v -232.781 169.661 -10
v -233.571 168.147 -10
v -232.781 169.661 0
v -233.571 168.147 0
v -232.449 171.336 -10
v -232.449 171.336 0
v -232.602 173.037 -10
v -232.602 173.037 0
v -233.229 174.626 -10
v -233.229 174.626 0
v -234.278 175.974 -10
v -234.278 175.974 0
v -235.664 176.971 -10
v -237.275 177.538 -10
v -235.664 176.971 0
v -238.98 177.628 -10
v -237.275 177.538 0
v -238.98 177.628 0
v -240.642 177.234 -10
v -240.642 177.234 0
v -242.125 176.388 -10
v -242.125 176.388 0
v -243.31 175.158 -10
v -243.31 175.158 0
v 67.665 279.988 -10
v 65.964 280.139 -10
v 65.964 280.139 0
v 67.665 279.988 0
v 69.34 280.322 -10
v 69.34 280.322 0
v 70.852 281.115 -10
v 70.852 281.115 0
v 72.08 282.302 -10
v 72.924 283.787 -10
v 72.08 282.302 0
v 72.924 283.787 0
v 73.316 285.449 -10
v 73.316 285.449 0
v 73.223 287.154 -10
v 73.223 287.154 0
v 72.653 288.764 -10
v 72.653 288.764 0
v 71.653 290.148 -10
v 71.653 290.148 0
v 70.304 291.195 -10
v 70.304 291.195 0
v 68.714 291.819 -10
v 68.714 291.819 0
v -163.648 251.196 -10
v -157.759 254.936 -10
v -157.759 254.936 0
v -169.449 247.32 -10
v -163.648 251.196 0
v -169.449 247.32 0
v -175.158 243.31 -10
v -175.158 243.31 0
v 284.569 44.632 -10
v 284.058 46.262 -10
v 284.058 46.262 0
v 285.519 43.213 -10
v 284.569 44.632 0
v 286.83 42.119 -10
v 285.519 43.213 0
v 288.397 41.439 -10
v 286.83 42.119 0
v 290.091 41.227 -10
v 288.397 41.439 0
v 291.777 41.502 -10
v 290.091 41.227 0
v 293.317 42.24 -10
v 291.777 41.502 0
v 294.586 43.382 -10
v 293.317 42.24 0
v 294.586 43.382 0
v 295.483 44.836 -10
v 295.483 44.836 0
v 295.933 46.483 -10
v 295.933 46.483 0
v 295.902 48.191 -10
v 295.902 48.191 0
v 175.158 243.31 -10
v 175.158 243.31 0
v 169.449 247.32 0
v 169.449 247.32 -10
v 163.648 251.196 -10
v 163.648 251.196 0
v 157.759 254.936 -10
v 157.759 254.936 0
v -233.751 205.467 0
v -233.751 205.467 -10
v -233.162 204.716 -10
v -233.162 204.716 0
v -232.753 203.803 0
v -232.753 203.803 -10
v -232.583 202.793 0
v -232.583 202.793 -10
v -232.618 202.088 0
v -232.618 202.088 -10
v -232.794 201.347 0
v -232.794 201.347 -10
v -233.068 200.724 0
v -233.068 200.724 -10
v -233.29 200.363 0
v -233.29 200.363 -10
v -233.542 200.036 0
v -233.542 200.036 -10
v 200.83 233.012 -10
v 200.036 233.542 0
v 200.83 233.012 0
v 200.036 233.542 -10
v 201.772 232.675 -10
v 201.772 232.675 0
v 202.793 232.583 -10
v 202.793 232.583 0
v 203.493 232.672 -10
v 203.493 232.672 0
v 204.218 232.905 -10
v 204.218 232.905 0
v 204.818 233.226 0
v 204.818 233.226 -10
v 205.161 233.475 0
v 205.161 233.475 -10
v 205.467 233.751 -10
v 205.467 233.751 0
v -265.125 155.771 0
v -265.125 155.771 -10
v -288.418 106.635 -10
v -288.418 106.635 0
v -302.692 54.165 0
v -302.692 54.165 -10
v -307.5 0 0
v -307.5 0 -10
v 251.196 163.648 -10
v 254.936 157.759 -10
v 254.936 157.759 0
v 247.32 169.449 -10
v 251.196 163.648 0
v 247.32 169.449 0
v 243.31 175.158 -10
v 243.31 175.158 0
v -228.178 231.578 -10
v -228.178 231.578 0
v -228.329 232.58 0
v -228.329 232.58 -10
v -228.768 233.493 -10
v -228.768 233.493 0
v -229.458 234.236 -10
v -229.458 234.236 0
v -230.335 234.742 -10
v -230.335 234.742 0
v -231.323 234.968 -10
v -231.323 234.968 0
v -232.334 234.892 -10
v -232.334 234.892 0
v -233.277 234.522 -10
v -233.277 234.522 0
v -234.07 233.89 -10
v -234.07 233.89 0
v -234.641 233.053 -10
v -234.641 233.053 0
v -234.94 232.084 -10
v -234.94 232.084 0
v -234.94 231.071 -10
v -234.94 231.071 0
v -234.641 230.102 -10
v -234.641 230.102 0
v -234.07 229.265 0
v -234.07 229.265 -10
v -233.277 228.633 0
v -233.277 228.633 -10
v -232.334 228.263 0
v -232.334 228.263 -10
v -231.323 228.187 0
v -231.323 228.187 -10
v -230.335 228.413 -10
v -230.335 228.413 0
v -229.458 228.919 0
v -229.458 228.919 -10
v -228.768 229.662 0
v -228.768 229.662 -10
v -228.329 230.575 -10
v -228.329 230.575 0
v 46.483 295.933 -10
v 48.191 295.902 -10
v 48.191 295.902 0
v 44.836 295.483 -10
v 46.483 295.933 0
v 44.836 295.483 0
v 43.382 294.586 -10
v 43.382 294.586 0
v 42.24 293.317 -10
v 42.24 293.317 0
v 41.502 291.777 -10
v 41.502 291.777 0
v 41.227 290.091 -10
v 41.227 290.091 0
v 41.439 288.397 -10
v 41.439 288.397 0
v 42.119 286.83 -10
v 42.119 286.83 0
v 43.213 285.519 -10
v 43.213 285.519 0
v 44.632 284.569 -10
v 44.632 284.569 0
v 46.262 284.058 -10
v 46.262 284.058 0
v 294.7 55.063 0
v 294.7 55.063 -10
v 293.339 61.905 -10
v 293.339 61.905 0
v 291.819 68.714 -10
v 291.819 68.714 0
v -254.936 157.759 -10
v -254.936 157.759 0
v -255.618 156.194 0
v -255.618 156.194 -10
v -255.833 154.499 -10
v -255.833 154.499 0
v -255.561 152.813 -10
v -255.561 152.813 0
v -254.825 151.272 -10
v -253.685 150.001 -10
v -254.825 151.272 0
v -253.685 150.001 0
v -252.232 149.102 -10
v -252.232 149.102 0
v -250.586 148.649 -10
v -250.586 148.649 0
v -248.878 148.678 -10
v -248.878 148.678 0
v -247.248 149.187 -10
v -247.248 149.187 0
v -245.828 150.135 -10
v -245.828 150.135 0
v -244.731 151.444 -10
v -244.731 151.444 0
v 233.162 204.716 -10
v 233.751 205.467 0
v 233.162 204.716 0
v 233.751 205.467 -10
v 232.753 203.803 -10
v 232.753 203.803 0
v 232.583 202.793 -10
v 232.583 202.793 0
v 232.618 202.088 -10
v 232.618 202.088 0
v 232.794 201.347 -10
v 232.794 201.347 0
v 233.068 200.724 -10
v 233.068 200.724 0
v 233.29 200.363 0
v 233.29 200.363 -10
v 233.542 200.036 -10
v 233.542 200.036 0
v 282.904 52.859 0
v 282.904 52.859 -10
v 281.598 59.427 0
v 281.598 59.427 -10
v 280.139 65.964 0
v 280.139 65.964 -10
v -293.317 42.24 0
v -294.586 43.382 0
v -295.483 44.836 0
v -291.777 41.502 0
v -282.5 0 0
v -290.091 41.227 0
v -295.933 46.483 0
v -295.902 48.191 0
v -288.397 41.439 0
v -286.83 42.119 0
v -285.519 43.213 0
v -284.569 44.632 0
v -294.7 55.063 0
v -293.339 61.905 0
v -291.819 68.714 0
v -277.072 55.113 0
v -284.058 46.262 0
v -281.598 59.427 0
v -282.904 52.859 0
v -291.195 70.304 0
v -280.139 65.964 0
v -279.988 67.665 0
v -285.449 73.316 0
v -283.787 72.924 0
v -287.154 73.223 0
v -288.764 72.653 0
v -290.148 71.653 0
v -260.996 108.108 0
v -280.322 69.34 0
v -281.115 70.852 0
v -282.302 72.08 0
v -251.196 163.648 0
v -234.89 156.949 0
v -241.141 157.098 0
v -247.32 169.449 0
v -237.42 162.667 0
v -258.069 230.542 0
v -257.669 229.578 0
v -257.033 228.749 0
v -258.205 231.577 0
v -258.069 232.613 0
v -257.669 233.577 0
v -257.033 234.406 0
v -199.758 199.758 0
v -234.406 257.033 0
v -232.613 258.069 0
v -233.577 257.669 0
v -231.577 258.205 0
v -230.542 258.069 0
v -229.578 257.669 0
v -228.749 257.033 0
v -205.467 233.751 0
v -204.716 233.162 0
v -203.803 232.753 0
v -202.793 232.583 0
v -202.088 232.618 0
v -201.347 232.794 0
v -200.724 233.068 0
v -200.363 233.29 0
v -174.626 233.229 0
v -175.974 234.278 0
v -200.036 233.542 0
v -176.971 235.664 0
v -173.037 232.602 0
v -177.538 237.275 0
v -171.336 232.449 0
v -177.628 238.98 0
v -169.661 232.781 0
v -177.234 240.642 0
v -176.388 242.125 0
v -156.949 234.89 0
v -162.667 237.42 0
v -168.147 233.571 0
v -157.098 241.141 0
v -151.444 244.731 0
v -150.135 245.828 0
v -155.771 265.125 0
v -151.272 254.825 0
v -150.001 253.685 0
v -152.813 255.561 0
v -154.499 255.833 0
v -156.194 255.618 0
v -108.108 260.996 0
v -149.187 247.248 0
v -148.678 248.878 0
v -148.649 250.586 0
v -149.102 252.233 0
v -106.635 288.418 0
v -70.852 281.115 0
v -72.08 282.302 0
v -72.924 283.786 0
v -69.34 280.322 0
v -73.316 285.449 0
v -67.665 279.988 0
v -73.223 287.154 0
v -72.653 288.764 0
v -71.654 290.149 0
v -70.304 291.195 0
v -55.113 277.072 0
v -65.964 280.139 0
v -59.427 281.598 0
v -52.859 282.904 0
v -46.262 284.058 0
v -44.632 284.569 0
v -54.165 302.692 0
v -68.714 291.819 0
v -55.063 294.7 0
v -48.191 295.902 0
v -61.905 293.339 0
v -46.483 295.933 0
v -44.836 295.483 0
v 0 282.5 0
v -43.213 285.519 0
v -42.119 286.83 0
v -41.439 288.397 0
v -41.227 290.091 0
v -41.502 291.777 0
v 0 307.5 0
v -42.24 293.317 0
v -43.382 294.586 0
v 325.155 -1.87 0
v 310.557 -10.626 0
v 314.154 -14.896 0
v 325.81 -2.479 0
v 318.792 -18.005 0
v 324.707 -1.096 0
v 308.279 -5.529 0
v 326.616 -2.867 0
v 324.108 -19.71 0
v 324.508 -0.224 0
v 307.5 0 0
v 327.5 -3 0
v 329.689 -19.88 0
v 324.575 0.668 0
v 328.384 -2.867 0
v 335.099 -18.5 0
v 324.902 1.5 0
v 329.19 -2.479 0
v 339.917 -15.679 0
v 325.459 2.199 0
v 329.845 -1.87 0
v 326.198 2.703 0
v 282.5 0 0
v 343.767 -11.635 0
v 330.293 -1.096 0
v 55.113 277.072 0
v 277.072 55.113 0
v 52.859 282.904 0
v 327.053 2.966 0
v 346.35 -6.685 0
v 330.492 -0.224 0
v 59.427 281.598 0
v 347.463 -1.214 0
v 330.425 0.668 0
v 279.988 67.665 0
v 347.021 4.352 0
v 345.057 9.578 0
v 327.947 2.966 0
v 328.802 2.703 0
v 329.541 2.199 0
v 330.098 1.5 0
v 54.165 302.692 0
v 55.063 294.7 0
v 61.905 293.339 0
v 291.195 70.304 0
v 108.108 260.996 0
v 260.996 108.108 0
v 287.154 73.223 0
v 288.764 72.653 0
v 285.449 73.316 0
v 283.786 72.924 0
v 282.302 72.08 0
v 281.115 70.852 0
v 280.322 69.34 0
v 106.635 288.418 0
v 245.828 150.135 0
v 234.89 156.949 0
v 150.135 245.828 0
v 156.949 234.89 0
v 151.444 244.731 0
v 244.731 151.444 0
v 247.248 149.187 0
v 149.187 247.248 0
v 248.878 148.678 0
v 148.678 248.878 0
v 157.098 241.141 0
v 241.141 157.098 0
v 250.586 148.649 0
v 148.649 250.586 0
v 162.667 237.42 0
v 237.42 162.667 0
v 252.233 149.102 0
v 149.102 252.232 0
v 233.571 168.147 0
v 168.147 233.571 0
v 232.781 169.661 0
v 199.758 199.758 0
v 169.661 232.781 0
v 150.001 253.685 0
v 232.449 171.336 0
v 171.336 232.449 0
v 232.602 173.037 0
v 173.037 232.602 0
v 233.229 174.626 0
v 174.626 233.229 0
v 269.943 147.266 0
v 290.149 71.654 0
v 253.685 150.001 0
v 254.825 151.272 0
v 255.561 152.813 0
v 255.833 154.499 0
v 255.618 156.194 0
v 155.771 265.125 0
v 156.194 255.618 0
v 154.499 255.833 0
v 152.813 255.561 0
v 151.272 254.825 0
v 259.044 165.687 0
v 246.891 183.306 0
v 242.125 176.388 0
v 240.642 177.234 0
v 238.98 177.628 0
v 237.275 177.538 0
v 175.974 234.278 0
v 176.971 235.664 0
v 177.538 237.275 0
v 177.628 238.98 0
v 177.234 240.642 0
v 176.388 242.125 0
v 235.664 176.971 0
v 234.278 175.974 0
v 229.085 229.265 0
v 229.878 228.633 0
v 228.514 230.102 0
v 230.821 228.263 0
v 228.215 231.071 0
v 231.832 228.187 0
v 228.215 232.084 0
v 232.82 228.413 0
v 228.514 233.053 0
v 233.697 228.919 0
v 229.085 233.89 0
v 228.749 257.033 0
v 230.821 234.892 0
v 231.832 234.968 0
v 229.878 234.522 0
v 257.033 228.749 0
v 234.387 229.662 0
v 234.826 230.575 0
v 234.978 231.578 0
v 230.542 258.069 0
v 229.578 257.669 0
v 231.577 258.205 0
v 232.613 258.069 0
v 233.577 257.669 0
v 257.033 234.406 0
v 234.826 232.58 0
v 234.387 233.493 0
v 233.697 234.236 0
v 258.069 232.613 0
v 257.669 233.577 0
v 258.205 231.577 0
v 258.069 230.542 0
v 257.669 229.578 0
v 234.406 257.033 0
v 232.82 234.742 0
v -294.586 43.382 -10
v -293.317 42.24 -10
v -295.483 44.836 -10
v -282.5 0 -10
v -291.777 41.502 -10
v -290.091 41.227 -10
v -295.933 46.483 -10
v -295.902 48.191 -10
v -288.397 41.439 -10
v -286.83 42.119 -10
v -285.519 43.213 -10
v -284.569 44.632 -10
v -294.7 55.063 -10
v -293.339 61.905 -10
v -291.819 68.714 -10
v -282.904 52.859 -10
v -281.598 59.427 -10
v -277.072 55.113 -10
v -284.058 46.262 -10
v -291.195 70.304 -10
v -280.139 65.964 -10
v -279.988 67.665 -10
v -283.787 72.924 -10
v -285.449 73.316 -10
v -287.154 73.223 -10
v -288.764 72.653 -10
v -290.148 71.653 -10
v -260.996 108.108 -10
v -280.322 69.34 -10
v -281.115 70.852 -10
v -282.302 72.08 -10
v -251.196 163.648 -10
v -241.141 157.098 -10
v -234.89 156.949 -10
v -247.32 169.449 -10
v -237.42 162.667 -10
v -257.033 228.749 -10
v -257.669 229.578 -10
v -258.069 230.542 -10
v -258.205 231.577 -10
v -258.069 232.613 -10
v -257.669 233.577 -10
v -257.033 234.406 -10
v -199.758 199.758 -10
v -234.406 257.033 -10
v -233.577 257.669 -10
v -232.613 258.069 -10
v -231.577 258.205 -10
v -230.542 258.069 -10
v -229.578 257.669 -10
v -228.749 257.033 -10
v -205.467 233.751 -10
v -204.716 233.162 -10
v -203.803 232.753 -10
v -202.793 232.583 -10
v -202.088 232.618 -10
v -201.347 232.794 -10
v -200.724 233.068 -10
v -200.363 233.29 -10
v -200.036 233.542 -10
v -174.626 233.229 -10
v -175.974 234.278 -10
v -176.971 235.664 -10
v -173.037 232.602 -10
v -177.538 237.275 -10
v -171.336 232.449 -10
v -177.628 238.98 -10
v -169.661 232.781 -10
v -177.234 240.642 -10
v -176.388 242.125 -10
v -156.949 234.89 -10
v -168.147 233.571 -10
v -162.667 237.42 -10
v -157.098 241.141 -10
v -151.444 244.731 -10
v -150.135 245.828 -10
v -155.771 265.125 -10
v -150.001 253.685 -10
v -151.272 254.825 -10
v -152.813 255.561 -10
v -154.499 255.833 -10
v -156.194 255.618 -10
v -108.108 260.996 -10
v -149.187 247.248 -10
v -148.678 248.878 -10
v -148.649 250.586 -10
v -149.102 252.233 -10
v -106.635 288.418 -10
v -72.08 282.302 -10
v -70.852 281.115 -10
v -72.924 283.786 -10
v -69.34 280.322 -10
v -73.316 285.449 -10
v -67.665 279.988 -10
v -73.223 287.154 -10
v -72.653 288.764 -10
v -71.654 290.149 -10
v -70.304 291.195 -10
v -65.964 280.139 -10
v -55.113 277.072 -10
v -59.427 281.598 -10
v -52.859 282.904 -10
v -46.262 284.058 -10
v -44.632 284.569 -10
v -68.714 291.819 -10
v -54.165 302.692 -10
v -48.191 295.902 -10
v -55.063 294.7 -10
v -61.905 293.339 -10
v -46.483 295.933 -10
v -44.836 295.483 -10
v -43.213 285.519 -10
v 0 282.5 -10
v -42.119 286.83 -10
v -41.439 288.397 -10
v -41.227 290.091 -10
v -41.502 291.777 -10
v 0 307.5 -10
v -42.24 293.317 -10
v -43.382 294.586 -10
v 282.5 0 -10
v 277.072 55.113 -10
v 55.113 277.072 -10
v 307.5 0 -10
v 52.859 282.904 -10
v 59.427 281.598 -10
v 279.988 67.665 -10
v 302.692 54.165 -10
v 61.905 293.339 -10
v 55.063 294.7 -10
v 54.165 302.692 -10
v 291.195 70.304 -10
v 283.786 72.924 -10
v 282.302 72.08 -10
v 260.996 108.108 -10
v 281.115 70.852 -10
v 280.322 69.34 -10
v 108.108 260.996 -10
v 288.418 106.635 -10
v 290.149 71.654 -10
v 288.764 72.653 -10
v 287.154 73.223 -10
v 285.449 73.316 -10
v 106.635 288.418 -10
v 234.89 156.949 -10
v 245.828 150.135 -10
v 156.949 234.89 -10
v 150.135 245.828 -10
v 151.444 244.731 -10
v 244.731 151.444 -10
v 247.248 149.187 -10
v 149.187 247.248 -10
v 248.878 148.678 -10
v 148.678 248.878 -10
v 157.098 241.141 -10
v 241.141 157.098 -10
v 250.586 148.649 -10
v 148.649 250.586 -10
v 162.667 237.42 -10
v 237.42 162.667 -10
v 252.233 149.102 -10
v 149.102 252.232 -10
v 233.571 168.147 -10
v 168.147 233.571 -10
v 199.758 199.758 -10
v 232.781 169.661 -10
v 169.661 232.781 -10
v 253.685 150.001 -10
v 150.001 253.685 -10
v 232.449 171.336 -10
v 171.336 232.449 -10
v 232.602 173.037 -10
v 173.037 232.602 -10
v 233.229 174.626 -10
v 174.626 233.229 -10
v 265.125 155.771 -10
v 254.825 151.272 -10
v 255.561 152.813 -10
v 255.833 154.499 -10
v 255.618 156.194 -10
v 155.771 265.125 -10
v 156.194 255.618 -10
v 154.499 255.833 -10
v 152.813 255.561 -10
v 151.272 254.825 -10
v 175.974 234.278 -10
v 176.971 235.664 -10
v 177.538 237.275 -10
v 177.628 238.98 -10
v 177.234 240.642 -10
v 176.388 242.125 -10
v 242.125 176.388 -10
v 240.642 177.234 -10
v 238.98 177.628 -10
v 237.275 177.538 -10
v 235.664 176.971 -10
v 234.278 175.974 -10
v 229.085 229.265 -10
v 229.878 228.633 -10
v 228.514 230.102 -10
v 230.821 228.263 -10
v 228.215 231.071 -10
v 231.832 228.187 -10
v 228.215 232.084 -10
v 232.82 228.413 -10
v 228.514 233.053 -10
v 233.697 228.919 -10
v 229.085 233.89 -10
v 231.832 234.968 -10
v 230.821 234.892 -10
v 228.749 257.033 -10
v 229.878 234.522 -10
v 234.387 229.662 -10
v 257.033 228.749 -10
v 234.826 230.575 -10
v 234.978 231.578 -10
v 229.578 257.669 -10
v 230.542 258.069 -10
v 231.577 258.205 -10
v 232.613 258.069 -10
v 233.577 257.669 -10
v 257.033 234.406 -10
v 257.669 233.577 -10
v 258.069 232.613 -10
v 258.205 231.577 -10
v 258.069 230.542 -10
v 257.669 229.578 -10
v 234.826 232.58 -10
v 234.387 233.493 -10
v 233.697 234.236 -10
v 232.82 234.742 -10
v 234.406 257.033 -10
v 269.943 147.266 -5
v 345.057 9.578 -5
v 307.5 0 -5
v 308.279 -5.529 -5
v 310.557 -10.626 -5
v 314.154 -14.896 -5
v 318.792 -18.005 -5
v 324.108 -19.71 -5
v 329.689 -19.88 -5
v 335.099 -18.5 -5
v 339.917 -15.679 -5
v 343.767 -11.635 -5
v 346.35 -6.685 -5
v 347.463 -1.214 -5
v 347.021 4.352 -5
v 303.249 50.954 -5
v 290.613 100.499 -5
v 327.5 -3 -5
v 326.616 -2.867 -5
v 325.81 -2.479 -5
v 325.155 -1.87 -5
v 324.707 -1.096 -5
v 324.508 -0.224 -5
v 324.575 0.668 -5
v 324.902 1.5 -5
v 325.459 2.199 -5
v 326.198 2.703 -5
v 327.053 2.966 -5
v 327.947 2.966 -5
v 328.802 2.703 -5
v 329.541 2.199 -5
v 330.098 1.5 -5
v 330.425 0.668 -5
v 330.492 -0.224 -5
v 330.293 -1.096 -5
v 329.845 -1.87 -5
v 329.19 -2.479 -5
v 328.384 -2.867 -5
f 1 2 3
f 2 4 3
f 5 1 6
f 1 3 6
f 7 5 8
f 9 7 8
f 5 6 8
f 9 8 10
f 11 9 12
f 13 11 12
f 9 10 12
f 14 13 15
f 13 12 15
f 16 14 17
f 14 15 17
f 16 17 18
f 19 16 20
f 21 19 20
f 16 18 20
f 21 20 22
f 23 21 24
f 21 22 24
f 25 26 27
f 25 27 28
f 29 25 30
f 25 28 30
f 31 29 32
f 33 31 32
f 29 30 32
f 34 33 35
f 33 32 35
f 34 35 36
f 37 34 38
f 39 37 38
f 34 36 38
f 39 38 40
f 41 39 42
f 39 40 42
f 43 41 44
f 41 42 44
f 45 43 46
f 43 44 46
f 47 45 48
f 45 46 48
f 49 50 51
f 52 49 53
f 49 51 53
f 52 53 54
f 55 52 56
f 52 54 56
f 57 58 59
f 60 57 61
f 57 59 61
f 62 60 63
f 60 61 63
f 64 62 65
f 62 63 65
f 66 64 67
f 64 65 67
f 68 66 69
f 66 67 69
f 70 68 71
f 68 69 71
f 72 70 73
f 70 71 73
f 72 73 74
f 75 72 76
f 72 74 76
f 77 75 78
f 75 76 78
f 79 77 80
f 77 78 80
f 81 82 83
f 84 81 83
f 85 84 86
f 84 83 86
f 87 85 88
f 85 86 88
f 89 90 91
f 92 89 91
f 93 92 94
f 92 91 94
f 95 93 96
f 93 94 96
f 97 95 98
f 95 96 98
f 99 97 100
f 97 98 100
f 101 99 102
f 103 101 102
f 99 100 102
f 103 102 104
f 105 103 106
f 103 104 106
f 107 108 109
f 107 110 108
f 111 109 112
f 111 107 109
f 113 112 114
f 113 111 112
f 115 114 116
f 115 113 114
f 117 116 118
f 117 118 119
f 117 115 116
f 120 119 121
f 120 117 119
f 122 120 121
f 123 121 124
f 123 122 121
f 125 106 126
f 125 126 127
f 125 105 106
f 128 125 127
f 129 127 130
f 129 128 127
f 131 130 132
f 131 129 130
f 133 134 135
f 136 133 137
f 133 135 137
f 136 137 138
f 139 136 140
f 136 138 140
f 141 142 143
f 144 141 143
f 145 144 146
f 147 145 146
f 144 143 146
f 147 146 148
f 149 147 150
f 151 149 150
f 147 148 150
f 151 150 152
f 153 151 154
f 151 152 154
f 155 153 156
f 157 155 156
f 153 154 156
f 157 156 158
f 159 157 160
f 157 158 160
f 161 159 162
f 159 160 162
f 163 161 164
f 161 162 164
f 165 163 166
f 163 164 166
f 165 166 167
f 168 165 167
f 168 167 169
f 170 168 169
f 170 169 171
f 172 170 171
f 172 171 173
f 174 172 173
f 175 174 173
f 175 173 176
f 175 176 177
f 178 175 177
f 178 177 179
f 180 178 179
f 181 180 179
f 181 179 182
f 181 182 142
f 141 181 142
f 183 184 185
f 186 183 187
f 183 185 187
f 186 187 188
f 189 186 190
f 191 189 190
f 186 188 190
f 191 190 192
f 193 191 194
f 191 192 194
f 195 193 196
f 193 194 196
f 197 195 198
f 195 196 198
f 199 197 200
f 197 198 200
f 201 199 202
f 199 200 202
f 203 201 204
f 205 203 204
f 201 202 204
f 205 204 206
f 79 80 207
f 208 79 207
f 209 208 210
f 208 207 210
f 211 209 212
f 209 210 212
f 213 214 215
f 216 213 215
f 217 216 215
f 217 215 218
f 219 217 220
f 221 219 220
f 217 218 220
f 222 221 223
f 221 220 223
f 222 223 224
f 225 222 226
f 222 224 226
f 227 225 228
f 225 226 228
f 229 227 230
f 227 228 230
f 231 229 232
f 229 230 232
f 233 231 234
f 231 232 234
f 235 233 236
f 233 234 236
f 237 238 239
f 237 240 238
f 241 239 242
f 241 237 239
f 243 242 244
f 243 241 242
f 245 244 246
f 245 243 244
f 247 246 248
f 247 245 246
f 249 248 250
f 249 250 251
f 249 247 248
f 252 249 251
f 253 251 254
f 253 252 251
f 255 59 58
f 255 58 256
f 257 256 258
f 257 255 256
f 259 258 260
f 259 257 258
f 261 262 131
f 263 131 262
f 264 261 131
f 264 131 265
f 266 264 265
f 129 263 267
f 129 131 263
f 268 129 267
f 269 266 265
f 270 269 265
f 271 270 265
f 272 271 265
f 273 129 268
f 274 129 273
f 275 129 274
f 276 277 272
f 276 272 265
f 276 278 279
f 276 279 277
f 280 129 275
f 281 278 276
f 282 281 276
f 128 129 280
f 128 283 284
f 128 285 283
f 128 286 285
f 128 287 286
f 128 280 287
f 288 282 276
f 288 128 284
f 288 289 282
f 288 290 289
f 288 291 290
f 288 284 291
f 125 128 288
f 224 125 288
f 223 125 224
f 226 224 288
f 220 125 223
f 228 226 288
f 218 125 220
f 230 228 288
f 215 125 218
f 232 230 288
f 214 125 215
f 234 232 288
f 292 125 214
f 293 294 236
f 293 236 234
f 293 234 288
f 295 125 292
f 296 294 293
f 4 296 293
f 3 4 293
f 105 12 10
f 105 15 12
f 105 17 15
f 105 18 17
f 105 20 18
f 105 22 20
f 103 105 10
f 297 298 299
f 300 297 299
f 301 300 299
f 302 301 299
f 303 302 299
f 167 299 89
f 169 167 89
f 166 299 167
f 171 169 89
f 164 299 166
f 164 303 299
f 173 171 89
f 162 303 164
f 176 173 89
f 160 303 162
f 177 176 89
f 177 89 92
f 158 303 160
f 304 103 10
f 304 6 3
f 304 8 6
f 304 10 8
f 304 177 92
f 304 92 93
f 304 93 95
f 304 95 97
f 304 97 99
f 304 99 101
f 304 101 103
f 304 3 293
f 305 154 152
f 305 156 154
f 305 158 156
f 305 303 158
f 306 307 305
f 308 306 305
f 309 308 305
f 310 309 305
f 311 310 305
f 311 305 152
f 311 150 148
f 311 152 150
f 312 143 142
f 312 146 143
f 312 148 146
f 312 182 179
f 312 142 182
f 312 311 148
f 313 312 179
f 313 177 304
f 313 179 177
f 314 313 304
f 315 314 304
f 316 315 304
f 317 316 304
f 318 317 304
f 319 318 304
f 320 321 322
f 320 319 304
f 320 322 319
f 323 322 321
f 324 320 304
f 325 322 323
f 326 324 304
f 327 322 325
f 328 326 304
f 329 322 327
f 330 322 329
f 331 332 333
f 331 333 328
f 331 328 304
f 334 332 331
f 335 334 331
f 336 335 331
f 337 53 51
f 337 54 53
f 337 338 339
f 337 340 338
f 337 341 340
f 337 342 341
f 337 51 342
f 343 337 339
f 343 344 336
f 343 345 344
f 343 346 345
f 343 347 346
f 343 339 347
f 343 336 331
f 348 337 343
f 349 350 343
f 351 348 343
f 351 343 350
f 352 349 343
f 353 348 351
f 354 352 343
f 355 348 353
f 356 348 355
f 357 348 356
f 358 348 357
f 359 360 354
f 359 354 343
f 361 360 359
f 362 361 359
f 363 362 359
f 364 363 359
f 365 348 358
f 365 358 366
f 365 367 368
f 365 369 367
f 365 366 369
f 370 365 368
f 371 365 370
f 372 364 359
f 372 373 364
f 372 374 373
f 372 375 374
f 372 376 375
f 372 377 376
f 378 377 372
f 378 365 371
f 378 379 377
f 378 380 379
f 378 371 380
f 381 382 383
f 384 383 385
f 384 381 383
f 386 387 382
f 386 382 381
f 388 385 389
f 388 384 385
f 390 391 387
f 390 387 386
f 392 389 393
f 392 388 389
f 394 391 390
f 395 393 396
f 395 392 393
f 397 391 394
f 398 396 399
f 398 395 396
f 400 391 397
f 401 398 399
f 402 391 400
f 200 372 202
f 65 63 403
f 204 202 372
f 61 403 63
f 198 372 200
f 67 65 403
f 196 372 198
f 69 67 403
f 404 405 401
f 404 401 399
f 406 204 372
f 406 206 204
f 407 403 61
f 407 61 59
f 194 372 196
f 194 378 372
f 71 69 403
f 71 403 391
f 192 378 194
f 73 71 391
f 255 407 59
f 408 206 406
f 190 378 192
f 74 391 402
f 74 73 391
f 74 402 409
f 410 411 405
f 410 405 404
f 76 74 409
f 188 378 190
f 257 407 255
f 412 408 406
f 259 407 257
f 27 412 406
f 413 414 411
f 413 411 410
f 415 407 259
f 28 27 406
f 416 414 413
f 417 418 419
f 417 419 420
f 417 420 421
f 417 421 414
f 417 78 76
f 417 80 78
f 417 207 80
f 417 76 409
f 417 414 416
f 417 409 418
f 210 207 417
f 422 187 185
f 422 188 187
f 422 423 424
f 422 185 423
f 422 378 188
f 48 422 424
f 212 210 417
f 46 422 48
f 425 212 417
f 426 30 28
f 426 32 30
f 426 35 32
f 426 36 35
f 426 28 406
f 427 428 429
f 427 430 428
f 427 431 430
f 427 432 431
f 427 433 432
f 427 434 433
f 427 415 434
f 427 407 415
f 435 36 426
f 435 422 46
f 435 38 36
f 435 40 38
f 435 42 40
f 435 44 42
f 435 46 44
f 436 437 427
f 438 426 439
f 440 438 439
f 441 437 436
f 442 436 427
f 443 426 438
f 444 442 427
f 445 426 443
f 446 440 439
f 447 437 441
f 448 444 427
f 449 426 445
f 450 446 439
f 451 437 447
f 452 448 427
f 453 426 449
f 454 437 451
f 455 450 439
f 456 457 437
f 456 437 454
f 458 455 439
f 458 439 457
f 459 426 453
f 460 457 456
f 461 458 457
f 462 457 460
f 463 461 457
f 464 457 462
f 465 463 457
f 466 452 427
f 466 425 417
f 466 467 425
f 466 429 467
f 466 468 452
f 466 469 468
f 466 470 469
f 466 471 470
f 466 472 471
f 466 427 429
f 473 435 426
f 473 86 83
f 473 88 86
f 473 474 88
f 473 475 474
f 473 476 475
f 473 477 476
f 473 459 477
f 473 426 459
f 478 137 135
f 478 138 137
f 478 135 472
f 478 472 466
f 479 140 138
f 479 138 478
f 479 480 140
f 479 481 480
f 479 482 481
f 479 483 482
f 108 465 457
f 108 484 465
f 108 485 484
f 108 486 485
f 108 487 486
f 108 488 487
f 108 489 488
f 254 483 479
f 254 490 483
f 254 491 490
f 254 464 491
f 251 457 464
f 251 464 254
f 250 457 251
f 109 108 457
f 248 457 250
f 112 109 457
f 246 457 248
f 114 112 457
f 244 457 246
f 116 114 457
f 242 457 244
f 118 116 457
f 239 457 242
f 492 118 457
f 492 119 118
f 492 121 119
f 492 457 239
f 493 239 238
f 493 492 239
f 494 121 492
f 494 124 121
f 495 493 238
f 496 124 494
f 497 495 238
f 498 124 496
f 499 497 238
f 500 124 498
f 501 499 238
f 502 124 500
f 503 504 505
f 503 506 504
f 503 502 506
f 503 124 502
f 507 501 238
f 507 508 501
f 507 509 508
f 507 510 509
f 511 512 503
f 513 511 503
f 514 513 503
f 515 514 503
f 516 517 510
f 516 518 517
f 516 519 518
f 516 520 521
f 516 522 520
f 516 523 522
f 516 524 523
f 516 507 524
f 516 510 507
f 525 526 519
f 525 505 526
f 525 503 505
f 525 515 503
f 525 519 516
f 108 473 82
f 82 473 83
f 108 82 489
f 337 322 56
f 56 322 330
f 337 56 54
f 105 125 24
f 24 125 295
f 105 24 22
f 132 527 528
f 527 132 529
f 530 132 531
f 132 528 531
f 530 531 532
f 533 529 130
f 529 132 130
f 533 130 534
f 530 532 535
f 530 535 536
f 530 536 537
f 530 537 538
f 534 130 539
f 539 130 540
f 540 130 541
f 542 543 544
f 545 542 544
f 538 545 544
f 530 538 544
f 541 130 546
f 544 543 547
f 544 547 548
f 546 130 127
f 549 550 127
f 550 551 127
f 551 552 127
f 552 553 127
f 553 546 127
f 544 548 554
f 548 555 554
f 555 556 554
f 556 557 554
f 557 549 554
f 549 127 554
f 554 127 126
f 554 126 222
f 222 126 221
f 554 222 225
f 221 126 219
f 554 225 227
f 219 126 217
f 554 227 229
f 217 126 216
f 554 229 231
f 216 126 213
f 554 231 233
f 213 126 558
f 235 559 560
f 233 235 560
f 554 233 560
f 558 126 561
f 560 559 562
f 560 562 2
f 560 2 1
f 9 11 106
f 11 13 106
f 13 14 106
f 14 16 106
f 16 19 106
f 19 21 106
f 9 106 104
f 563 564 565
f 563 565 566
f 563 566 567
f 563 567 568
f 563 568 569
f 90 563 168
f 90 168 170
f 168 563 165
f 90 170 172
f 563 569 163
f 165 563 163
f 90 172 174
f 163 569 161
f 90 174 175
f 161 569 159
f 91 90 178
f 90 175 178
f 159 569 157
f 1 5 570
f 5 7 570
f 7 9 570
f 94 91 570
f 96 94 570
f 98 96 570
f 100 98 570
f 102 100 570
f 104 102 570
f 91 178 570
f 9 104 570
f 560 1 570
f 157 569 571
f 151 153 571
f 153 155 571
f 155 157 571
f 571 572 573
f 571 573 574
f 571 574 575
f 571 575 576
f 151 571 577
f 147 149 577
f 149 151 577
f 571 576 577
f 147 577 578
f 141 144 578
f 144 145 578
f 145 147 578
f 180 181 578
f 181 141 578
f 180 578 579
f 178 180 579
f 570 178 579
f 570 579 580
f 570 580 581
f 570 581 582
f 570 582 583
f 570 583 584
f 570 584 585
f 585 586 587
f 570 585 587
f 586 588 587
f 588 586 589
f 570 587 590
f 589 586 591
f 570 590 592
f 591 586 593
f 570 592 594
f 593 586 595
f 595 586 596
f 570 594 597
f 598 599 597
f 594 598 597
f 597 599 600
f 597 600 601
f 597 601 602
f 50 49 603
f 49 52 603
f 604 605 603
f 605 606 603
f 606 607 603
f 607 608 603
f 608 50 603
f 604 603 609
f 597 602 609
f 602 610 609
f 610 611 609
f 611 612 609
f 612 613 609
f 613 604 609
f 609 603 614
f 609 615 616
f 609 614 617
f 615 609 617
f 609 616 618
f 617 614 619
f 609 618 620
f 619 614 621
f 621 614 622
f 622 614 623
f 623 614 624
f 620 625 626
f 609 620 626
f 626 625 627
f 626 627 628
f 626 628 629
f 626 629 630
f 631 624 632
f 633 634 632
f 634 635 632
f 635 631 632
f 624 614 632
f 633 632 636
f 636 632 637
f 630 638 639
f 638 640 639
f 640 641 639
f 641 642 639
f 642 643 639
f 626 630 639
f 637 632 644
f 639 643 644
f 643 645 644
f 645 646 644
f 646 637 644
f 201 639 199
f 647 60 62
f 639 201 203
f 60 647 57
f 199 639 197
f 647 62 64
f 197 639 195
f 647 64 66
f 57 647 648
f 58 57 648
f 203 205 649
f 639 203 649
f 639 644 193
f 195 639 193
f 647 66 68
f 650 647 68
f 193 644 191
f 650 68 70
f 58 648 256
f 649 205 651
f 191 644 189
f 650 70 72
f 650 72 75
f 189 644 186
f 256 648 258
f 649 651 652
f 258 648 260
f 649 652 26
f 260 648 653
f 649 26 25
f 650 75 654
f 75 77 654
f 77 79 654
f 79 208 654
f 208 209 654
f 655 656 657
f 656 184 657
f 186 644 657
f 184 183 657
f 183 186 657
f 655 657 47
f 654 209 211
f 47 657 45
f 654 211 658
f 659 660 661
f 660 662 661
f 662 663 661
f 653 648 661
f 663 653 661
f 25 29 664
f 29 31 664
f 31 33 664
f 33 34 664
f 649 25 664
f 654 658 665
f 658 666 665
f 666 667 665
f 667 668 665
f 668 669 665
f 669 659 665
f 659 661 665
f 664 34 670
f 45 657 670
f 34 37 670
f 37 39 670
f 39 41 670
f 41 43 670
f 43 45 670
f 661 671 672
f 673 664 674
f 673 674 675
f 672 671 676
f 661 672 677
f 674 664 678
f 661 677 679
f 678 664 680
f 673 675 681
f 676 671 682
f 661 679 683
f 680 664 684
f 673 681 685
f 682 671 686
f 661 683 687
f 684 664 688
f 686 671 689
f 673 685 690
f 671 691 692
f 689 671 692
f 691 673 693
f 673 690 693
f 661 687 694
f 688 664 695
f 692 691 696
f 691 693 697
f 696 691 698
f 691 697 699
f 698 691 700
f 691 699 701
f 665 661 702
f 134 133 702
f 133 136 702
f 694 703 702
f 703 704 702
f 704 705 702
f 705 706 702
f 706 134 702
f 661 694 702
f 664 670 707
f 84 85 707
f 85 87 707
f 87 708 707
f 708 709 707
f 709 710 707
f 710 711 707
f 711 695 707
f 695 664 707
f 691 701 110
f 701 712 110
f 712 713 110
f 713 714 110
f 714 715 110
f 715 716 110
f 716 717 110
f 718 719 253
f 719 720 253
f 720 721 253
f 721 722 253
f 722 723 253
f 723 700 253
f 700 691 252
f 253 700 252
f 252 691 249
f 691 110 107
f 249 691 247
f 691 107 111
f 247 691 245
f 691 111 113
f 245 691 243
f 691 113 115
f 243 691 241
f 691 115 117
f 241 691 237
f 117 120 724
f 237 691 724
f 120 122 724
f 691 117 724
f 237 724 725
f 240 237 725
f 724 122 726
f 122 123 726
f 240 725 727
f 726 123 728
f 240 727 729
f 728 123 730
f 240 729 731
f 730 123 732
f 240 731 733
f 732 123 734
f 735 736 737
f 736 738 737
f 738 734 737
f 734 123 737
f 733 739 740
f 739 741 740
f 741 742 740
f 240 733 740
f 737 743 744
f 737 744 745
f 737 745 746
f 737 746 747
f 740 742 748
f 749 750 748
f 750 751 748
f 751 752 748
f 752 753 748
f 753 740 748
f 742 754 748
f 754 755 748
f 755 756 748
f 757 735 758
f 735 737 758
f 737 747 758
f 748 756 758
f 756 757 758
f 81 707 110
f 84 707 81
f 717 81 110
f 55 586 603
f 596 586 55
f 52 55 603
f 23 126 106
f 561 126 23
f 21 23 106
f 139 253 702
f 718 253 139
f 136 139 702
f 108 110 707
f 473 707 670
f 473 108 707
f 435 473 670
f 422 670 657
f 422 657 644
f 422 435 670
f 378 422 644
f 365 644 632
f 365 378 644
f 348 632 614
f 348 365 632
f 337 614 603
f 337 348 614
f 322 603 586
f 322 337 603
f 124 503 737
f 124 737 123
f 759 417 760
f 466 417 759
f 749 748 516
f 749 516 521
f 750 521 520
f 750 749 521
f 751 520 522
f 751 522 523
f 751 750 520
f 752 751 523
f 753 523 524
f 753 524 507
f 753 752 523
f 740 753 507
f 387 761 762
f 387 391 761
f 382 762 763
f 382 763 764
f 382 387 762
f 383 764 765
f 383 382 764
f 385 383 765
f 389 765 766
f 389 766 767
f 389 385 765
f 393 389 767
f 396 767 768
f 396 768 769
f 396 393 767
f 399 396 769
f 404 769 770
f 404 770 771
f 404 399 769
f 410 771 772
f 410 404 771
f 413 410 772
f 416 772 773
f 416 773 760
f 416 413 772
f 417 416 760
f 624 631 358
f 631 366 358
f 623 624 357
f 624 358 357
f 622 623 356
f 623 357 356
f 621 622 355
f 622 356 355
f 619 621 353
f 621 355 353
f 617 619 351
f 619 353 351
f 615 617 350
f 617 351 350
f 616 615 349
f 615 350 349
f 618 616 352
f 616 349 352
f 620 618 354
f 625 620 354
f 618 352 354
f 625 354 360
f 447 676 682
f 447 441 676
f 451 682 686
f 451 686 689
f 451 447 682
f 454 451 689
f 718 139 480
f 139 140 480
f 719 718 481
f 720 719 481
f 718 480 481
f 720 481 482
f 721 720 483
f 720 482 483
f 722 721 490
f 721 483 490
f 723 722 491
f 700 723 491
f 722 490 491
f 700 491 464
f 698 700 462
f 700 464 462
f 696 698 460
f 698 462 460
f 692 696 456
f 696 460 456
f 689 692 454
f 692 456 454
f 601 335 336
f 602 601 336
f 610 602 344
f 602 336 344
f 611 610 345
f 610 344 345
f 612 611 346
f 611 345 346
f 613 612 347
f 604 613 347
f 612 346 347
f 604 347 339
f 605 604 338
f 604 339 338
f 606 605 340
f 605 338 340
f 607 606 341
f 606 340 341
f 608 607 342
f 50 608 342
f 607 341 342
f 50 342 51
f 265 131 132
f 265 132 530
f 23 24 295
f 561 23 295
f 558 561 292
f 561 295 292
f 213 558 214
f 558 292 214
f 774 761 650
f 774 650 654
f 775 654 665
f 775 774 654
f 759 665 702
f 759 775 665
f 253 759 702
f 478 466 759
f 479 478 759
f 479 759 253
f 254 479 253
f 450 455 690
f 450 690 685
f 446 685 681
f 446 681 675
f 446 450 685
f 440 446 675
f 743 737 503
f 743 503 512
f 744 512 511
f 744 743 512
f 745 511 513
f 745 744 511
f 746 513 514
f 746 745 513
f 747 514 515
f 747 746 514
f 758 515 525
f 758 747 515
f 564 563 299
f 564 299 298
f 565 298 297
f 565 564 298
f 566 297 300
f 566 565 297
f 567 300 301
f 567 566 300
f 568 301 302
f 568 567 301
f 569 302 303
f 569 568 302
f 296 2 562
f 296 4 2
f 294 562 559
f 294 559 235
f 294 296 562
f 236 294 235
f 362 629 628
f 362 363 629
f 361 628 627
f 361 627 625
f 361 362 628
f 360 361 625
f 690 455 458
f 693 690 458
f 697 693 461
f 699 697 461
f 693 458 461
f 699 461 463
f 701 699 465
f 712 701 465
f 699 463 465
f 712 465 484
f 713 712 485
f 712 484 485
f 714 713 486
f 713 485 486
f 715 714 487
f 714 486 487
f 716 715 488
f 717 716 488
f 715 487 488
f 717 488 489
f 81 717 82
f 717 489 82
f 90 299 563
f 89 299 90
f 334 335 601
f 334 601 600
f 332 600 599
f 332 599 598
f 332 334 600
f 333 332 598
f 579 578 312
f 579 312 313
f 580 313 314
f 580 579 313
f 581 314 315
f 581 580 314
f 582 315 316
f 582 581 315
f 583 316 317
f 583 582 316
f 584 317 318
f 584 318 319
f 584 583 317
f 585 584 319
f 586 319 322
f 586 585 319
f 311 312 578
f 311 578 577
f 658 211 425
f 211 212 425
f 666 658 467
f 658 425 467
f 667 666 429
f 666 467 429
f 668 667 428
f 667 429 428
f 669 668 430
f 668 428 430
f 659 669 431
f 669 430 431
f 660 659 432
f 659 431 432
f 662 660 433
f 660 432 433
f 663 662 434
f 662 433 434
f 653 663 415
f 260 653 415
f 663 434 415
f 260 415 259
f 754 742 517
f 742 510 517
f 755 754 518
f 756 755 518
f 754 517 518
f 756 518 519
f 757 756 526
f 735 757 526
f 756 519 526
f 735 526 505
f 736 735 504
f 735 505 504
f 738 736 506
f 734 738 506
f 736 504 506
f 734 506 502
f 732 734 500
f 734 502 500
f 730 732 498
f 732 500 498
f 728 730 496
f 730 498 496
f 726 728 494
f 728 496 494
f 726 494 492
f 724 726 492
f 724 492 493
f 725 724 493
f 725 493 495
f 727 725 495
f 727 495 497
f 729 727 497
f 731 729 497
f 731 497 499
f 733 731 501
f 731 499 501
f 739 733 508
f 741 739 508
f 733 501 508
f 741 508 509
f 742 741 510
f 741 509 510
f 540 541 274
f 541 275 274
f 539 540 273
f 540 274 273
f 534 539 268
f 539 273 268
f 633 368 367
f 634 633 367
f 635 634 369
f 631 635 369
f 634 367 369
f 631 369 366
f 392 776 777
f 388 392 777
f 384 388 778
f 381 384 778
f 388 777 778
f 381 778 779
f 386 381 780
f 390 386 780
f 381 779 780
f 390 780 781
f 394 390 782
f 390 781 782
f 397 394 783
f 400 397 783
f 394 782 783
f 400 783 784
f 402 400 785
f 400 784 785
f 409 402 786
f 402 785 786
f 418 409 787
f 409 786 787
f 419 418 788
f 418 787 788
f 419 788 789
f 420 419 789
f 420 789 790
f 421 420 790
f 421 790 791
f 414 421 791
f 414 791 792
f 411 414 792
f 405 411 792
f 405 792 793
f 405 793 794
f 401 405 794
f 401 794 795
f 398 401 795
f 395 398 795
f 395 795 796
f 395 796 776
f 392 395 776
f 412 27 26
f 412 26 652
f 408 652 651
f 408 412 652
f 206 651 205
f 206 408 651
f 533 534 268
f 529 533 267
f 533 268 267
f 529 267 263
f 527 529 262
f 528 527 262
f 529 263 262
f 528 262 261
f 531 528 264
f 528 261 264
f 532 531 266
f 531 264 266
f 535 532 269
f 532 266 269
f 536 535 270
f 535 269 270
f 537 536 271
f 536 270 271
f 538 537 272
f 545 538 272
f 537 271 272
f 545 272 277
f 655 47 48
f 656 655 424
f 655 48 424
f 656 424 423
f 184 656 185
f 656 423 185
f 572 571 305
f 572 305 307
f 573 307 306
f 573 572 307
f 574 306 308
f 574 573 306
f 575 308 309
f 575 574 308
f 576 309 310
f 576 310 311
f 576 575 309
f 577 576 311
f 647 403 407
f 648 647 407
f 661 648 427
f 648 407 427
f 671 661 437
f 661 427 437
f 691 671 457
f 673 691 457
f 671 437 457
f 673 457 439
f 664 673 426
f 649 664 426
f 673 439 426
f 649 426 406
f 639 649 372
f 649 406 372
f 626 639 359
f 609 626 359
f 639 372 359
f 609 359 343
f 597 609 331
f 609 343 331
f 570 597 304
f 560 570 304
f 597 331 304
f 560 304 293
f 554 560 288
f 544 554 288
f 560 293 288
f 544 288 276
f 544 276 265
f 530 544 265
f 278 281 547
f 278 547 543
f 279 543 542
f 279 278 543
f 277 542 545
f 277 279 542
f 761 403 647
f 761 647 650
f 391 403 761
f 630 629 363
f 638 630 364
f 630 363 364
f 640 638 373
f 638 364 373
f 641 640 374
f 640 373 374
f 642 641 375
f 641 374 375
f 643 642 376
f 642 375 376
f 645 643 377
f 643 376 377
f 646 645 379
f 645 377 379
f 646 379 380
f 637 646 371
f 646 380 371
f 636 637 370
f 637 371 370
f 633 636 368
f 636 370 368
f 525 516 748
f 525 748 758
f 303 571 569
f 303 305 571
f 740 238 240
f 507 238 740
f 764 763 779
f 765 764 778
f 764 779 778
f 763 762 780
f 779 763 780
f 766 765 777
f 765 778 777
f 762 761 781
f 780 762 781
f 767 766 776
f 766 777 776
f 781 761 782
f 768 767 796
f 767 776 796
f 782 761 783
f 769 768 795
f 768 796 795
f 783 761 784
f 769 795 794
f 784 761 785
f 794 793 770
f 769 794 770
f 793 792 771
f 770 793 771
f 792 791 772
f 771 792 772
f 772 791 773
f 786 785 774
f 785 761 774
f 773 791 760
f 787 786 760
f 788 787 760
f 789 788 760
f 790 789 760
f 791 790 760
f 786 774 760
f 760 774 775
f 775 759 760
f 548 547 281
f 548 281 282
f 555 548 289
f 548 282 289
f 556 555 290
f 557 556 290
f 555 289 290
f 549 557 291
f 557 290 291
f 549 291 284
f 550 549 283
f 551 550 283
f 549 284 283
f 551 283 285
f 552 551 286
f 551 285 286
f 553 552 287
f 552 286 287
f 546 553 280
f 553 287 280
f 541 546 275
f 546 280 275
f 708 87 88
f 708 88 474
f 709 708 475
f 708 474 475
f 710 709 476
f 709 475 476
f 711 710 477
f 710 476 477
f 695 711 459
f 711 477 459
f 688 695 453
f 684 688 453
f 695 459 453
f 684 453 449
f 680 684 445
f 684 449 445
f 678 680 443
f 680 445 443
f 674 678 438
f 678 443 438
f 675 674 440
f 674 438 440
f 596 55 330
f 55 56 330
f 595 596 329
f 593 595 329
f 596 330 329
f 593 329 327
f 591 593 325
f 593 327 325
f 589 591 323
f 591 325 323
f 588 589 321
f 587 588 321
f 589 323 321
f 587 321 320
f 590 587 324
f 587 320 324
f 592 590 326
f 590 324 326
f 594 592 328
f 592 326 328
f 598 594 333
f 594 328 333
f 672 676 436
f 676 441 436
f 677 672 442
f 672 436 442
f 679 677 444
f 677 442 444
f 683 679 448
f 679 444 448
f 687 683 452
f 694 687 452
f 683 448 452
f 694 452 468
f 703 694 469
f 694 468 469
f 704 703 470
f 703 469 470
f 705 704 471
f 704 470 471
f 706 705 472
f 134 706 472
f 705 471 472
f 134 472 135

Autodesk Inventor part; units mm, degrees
ref_plane "YZ Plane" through (0, 0, 0) normal (1, 0, 0) x (0, 1, 0)
ref_plane "XZ Plane" through (0, 0, 0) normal (0, 1, 0) x (-1, 0, 0)
ref_plane "XY Plane" through (0, 0, 0) normal (0, 0, 1) x (1, 0, 0)
sketch "Sketch7" plane through (0, 0, 0) normal (0, 0, 1) x (1, 0, 0)
  circle A0 centre (-231.5775, 231.5775) radius 3.4
  line L0 (-231.5775, 203.2932) -> (-203.2932, 231.5775)
  line L1 (-203.2932, 231.5775) -> (-231.5775, 259.8617)
  line L2 (-231.5775, 259.8617) -> (-259.8617, 231.5775)
  line L3 (-259.8617, 231.5775) -> (-231.5775, 203.2932)
  line L4 (-231.5775, 203.2932) -> (-231.5775, 259.8617) construction
  line L5 (-203.2932, 231.5775) -> (-259.8617, 231.5775) construction
  line L6 (-231.5775, 203.2932) -> (-191.5775, 203.2932) construction
  arc A1 (289.9795, 47.2262) -> (285.9788, 67.3391) centre (0, 0) ccw construction
  arc A2 (295.9015, 48.1906) -> (291.8191, 68.7143) centre (0, 0) ccw
  arc A3 (284.0576, 46.2617) -> (280.1386, 65.9639) centre (0, 0) ccw
  arc A4 (284.0576, 46.2617) -> (295.9015, 48.1906) centre (289.9795, 47.2262) ccw
  arc A5 (291.8191, 68.7143) -> (280.1386, 65.9639) centre (285.9788, 67.3391) ccw
  line L7 (0, 0) -> (289.9795, 47.2262) construction
  line L8 (0, 0) -> (293.8, 0) construction
  line L9 (0, 0) -> (285.9788, 67.3391) construction
  circle A6 centre (0, 0) radius 307.5
  circle A7 centre (0, 0) radius 282.5
  line L10 (-203.2932, 231.5775) -> (-185.1143, 213.3986)
  line L11 (-231.5775, 203.2932) -> (-213.3986, 185.1143)
  line L12 (-307.5, 0) -> (0, 0)
  line L13 (0, 0) -> (307.5, 0)
  line L14 (-231.5775, -203.2932) -> (-259.8617, -231.5775)
  line L15 (-259.8617, -231.5775) -> (-231.5775, -259.8617)
  circle A8 centre (-231.5775, -231.5775) radius 3.4
  line L16 (-231.5775, -259.8617) -> (-203.2932, -231.5775)
  line L17 (-203.2932, -231.5775) -> (-231.5775, -203.2932)
  line L18 (-203.2932, -231.5775) -> (-185.1143, -213.3986)
  line L19 (-231.5775, -203.2932) -> (-213.3986, -185.1143)
  line L20 (203.2932, -231.5775) -> (231.5775, -259.8617)
  line L21 (231.5775, -259.8617) -> (259.8617, -231.5775)
  circle A9 centre (231.5775, -231.5775) radius 3.4
  line L22 (259.8617, -231.5775) -> (231.5775, -203.2932)
  line L23 (231.5775, -203.2932) -> (203.2932, -231.5775)
  line L24 (231.5775, -203.2932) -> (213.3986, -185.1143)
  line L25 (203.2932, -231.5775) -> (185.1143, -213.3986)
  line L26 (231.5775, 203.2932) -> (259.8617, 231.5775)
  line L27 (259.8617, 231.5775) -> (231.5775, 259.8617)
  circle A10 centre (231.5775, 231.5775) radius 3.4
  line L28 (231.5775, 259.8617) -> (203.2932, 231.5775)
  line L29 (203.2932, 231.5775) -> (231.5775, 203.2932)
  line L30 (203.2932, 231.5775) -> (185.1143, 213.3986)
  line L31 (231.5775, 203.2932) -> (213.3986, 185.1143)
  arc A11 (254.9356, 157.7589) -> (243.3099, 175.158) centre (0, 0) ccw
  arc A12 (243.3099, 175.158) -> (233.571, 168.1471) centre (238.4404, 171.6526) ccw
  arc A13 (244.7314, 151.4444) -> (233.571, 168.1471) centre (0, 0) ccw
  arc A14 (244.7314, 151.4444) -> (254.9356, 157.7589) centre (249.8335, 154.6017) ccw
  arc A15 (175.158, 243.3099) -> (157.7589, 254.9356) centre (0, 0) ccw
  arc A16 (157.7589, 254.9356) -> (151.4444, 244.7314) centre (154.6017, 249.8335) ccw
  arc A17 (168.1471, 233.571) -> (151.4444, 244.7314) centre (0, 0) ccw
  arc A18 (168.1471, 233.571) -> (175.158, 243.3099) centre (171.6526, 238.4404) ccw
  arc A19 (68.7143, 291.8191) -> (48.1906, 295.9015) centre (0, 0) ccw
  arc A20 (48.1906, 295.9015) -> (46.2617, 284.0576) centre (47.2262, 289.9795) ccw
  arc A21 (65.9639, 280.1386) -> (46.2617, 284.0576) centre (0, 0) ccw
  arc A22 (65.9639, 280.1386) -> (68.7143, 291.8191) centre (67.3391, 285.9788) ccw
  arc A23 (-48.1906, 295.9015) -> (-68.7143, 291.8191) centre (0, 0) ccw
  arc A24 (-68.7143, 291.8191) -> (-65.9639, 280.1386) centre (-67.3391, 285.9788) ccw
  arc A25 (-46.2617, 284.0576) -> (-65.9639, 280.1386) centre (0, 0) ccw
  arc A26 (-46.2617, 284.0576) -> (-48.1906, 295.9015) centre (-47.2262, 289.9795) ccw
  arc A27 (-157.7589, 254.9356) -> (-175.158, 243.3099) centre (0, 0) ccw
  arc A28 (-175.158, 243.3099) -> (-168.1471, 233.571) centre (-171.6526, 238.4404) ccw
  arc A29 (-151.4444, 244.7314) -> (-168.1471, 233.571) centre (0, 0) ccw
  arc A30 (-151.4444, 244.7314) -> (-157.7589, 254.9356) centre (-154.6017, 249.8335) ccw
  arc A31 (-243.3099, 175.158) -> (-254.9356, 157.7589) centre (0, 0) ccw
  arc A32 (-254.9356, 157.7589) -> (-244.7314, 151.4444) centre (-249.8335, 154.6017) ccw
  arc A33 (-233.571, 168.1471) -> (-244.7314, 151.4444) centre (0, 0) ccw
  arc A34 (-233.571, 168.1471) -> (-243.3099, 175.158) centre (-238.4404, 171.6526) ccw
  arc A35 (-291.8191, 68.7143) -> (-295.9015, 48.1906) centre (0, 0) ccw
  arc A36 (-295.9015, 48.1906) -> (-284.0576, 46.2617) centre (-289.9795, 47.2262) ccw
  arc A37 (-280.1386, 65.9639) -> (-284.0576, 46.2617) centre (0, 0) ccw
  arc A38 (-280.1386, 65.9639) -> (-291.8191, 68.7143) centre (-285.9788, 67.3391) ccw
  arc A39 (-295.9015, -48.1906) -> (-291.8191, -68.7143) centre (0, 0) ccw
  arc A40 (-291.8191, -68.7143) -> (-280.1386, -65.9639) centre (-285.9788, -67.3391) ccw
  arc A41 (-284.0576, -46.2617) -> (-280.1386, -65.9639) centre (0, 0) ccw
  arc A42 (-284.0576, -46.2617) -> (-295.9015, -48.1906) centre (-289.9795, -47.2262) ccw
  arc A43 (-254.9356, -157.7589) -> (-243.3099, -175.158) centre (0, 0) ccw
  arc A44 (-243.3099, -175.158) -> (-233.571, -168.1471) centre (-238.4404, -171.6526) ccw
  arc A45 (-244.7314, -151.4444) -> (-233.571, -168.1471) centre (0, 0) ccw
  arc A46 (-244.7314, -151.4444) -> (-254.9356, -157.7589) centre (-249.8335, -154.6017) ccw
  arc A47 (-175.158, -243.3099) -> (-157.7589, -254.9356) centre (0, 0) ccw
  arc A48 (-157.7589, -254.9356) -> (-151.4444, -244.7314) centre (-154.6017, -249.8335) ccw
  arc A49 (-168.1471, -233.571) -> (-151.4444, -244.7314) centre (0, 0) ccw
  arc A50 (-168.1471, -233.571) -> (-175.158, -243.3099) centre (-171.6526, -238.4404) ccw
  arc A51 (-68.7143, -291.8191) -> (-48.1906, -295.9015) centre (0, 0) ccw
  arc A52 (-48.1906, -295.9015) -> (-46.2617, -284.0576) centre (-47.2262, -289.9795) ccw
  arc A53 (-65.9639, -280.1386) -> (-46.2617, -284.0576) centre (0, 0) ccw
  arc A54 (-65.9639, -280.1386) -> (-68.7143, -291.8191) centre (-67.3391, -285.9788) ccw
  arc A55 (48.1906, -295.9015) -> (68.7143, -291.8191) centre (0, 0) ccw
  arc A56 (68.7143, -291.8191) -> (65.9639, -280.1386) centre (67.3391, -285.9788) ccw
  arc A57 (46.2617, -284.0576) -> (65.9639, -280.1386) centre (0, 0) ccw
  arc A58 (46.2617, -284.0576) -> (48.1906, -295.9015) centre (47.2262, -289.9795) ccw
  arc A59 (157.7589, -254.9356) -> (175.158, -243.3099) centre (0, 0) ccw
  arc A60 (175.158, -243.3099) -> (168.1471, -233.571) centre (171.6526, -238.4404) ccw
  arc A61 (151.4444, -244.7314) -> (168.1471, -233.571) centre (0, 0) ccw
  arc A62 (151.4444, -244.7314) -> (157.7589, -254.9356) centre (154.6017, -249.8335) ccw
  arc A63 (243.3099, -175.158) -> (254.9356, -157.7589) centre (0, 0) ccw
  arc A64 (254.9356, -157.7589) -> (244.7314, -151.4444) centre (249.8335, -154.6017) ccw
  arc A65 (233.571, -168.1471) -> (244.7314, -151.4444) centre (0, 0) ccw
  arc A66 (233.571, -168.1471) -> (243.3099, -175.158) centre (238.4404, -171.6526) ccw
  arc A67 (291.8191, -68.7143) -> (295.9015, -48.1906) centre (0, 0) ccw
  arc A68 (295.9015, -48.1906) -> (284.0576, -46.2617) centre (289.9795, -47.2262) ccw
  arc A69 (280.1386, -65.9639) -> (284.0576, -46.2617) centre (0, 0) ccw
  arc A70 (280.1386, -65.9639) -> (291.8191, -68.7143) centre (285.9788, -67.3391) ccw
  circle A71 centre (327.5, 0) radius 20
  line L32 (345.0573, 9.5783) -> (269.9427, 147.2656)
  point P0 (-202.8328, 231.1171)
  point P1 (-231.1171, 202.8328)
  point P2 (-282.5, 0)
  point P3 (282.5, 0)
  point P4 (231.1171, 202.8328)
  point P5 (202.8328, 231.1171)
  point P6 (307.5, 0)
  dimension "d173" = 40
  dimension "d131" = 6.8
  dimension "d132" = 231.5775
  dimension "d133" = 231.5775
  dimension "d135" = 45
  dimension "d137" = 40
  dimension "d138" = 40
  dimension "d144" = 293.8
  dimension "d145" = 9.25
  dimension "d146" = 4
  dimension "d147" = 12
  dimension "d148" = 615
  dimension "d149" = 565
  dimension "d152" = 360
  dimension "d156" = 360
  dimension "d174" = 0
  dimension "d175" = 327.5
extrude "Extrusion11" add sketch "Sketch7" against normal blind 10 contours L3 L2 L1 L0 | L0 A6 L11 | L0 L10 A6 | A6 L10 A7 L11 | L11 A7 L12 A6 | A6 L30 A7 L10 | L30 L29 A6 | A6 L31 A7 L30 | L29 L31 A6 | L29 L28 L27 L26 | A6 L13 A7 L31
fillet "Fillet4" radius 4 8 edges at (-231.1171, 202.8328, -5) (-259.8617, 231.5775, -5) (-202.8328, 231.1171, -5) (-231.5775, 259.8617, -5) (231.5775, 259.8617, -5) (259.8617, 231.5775, -5) (202.8328, 231.1171, -5) (231.1171, 202.8328, -5)
extrude "Extrusion13" add sketch "Sketch7" against normal blind 5 contours L32 A71 A6 | A71
hole "Hole5" at (0, 0, 0) at (327.5, 0, 0) direction (0, 0, -1) diameter 6 end through all
equation "\"bar_screw_hole_diam\" = 6.8"
equation "\"foot_length\" = 14"
equation "\"rim_diam\" = 605"
equation "\"tube_inner_diam\" = 541"
equation "\"tube_outer_diam\" = 561"
equation "\"ring_delta\" = 2"
equation "\"bar_delta\" = 5"
equation "\"bar_circle_diam\" = 655"
equation "\"ring_inner_diam\" = 565"
equation "\"ring_outer_diam\" = 615"
equation "\"slot_angle\" = 9.25deg"
equation "\"slot_diam\" = 12"
equation "\"slots_circle_diam\" = 587.6"
equation "\"foot_screw_diam\" = 6"
equation "\"bar_fillet\" = 4"
properties part number "half_ring_1" material "Aluminum 6061"
